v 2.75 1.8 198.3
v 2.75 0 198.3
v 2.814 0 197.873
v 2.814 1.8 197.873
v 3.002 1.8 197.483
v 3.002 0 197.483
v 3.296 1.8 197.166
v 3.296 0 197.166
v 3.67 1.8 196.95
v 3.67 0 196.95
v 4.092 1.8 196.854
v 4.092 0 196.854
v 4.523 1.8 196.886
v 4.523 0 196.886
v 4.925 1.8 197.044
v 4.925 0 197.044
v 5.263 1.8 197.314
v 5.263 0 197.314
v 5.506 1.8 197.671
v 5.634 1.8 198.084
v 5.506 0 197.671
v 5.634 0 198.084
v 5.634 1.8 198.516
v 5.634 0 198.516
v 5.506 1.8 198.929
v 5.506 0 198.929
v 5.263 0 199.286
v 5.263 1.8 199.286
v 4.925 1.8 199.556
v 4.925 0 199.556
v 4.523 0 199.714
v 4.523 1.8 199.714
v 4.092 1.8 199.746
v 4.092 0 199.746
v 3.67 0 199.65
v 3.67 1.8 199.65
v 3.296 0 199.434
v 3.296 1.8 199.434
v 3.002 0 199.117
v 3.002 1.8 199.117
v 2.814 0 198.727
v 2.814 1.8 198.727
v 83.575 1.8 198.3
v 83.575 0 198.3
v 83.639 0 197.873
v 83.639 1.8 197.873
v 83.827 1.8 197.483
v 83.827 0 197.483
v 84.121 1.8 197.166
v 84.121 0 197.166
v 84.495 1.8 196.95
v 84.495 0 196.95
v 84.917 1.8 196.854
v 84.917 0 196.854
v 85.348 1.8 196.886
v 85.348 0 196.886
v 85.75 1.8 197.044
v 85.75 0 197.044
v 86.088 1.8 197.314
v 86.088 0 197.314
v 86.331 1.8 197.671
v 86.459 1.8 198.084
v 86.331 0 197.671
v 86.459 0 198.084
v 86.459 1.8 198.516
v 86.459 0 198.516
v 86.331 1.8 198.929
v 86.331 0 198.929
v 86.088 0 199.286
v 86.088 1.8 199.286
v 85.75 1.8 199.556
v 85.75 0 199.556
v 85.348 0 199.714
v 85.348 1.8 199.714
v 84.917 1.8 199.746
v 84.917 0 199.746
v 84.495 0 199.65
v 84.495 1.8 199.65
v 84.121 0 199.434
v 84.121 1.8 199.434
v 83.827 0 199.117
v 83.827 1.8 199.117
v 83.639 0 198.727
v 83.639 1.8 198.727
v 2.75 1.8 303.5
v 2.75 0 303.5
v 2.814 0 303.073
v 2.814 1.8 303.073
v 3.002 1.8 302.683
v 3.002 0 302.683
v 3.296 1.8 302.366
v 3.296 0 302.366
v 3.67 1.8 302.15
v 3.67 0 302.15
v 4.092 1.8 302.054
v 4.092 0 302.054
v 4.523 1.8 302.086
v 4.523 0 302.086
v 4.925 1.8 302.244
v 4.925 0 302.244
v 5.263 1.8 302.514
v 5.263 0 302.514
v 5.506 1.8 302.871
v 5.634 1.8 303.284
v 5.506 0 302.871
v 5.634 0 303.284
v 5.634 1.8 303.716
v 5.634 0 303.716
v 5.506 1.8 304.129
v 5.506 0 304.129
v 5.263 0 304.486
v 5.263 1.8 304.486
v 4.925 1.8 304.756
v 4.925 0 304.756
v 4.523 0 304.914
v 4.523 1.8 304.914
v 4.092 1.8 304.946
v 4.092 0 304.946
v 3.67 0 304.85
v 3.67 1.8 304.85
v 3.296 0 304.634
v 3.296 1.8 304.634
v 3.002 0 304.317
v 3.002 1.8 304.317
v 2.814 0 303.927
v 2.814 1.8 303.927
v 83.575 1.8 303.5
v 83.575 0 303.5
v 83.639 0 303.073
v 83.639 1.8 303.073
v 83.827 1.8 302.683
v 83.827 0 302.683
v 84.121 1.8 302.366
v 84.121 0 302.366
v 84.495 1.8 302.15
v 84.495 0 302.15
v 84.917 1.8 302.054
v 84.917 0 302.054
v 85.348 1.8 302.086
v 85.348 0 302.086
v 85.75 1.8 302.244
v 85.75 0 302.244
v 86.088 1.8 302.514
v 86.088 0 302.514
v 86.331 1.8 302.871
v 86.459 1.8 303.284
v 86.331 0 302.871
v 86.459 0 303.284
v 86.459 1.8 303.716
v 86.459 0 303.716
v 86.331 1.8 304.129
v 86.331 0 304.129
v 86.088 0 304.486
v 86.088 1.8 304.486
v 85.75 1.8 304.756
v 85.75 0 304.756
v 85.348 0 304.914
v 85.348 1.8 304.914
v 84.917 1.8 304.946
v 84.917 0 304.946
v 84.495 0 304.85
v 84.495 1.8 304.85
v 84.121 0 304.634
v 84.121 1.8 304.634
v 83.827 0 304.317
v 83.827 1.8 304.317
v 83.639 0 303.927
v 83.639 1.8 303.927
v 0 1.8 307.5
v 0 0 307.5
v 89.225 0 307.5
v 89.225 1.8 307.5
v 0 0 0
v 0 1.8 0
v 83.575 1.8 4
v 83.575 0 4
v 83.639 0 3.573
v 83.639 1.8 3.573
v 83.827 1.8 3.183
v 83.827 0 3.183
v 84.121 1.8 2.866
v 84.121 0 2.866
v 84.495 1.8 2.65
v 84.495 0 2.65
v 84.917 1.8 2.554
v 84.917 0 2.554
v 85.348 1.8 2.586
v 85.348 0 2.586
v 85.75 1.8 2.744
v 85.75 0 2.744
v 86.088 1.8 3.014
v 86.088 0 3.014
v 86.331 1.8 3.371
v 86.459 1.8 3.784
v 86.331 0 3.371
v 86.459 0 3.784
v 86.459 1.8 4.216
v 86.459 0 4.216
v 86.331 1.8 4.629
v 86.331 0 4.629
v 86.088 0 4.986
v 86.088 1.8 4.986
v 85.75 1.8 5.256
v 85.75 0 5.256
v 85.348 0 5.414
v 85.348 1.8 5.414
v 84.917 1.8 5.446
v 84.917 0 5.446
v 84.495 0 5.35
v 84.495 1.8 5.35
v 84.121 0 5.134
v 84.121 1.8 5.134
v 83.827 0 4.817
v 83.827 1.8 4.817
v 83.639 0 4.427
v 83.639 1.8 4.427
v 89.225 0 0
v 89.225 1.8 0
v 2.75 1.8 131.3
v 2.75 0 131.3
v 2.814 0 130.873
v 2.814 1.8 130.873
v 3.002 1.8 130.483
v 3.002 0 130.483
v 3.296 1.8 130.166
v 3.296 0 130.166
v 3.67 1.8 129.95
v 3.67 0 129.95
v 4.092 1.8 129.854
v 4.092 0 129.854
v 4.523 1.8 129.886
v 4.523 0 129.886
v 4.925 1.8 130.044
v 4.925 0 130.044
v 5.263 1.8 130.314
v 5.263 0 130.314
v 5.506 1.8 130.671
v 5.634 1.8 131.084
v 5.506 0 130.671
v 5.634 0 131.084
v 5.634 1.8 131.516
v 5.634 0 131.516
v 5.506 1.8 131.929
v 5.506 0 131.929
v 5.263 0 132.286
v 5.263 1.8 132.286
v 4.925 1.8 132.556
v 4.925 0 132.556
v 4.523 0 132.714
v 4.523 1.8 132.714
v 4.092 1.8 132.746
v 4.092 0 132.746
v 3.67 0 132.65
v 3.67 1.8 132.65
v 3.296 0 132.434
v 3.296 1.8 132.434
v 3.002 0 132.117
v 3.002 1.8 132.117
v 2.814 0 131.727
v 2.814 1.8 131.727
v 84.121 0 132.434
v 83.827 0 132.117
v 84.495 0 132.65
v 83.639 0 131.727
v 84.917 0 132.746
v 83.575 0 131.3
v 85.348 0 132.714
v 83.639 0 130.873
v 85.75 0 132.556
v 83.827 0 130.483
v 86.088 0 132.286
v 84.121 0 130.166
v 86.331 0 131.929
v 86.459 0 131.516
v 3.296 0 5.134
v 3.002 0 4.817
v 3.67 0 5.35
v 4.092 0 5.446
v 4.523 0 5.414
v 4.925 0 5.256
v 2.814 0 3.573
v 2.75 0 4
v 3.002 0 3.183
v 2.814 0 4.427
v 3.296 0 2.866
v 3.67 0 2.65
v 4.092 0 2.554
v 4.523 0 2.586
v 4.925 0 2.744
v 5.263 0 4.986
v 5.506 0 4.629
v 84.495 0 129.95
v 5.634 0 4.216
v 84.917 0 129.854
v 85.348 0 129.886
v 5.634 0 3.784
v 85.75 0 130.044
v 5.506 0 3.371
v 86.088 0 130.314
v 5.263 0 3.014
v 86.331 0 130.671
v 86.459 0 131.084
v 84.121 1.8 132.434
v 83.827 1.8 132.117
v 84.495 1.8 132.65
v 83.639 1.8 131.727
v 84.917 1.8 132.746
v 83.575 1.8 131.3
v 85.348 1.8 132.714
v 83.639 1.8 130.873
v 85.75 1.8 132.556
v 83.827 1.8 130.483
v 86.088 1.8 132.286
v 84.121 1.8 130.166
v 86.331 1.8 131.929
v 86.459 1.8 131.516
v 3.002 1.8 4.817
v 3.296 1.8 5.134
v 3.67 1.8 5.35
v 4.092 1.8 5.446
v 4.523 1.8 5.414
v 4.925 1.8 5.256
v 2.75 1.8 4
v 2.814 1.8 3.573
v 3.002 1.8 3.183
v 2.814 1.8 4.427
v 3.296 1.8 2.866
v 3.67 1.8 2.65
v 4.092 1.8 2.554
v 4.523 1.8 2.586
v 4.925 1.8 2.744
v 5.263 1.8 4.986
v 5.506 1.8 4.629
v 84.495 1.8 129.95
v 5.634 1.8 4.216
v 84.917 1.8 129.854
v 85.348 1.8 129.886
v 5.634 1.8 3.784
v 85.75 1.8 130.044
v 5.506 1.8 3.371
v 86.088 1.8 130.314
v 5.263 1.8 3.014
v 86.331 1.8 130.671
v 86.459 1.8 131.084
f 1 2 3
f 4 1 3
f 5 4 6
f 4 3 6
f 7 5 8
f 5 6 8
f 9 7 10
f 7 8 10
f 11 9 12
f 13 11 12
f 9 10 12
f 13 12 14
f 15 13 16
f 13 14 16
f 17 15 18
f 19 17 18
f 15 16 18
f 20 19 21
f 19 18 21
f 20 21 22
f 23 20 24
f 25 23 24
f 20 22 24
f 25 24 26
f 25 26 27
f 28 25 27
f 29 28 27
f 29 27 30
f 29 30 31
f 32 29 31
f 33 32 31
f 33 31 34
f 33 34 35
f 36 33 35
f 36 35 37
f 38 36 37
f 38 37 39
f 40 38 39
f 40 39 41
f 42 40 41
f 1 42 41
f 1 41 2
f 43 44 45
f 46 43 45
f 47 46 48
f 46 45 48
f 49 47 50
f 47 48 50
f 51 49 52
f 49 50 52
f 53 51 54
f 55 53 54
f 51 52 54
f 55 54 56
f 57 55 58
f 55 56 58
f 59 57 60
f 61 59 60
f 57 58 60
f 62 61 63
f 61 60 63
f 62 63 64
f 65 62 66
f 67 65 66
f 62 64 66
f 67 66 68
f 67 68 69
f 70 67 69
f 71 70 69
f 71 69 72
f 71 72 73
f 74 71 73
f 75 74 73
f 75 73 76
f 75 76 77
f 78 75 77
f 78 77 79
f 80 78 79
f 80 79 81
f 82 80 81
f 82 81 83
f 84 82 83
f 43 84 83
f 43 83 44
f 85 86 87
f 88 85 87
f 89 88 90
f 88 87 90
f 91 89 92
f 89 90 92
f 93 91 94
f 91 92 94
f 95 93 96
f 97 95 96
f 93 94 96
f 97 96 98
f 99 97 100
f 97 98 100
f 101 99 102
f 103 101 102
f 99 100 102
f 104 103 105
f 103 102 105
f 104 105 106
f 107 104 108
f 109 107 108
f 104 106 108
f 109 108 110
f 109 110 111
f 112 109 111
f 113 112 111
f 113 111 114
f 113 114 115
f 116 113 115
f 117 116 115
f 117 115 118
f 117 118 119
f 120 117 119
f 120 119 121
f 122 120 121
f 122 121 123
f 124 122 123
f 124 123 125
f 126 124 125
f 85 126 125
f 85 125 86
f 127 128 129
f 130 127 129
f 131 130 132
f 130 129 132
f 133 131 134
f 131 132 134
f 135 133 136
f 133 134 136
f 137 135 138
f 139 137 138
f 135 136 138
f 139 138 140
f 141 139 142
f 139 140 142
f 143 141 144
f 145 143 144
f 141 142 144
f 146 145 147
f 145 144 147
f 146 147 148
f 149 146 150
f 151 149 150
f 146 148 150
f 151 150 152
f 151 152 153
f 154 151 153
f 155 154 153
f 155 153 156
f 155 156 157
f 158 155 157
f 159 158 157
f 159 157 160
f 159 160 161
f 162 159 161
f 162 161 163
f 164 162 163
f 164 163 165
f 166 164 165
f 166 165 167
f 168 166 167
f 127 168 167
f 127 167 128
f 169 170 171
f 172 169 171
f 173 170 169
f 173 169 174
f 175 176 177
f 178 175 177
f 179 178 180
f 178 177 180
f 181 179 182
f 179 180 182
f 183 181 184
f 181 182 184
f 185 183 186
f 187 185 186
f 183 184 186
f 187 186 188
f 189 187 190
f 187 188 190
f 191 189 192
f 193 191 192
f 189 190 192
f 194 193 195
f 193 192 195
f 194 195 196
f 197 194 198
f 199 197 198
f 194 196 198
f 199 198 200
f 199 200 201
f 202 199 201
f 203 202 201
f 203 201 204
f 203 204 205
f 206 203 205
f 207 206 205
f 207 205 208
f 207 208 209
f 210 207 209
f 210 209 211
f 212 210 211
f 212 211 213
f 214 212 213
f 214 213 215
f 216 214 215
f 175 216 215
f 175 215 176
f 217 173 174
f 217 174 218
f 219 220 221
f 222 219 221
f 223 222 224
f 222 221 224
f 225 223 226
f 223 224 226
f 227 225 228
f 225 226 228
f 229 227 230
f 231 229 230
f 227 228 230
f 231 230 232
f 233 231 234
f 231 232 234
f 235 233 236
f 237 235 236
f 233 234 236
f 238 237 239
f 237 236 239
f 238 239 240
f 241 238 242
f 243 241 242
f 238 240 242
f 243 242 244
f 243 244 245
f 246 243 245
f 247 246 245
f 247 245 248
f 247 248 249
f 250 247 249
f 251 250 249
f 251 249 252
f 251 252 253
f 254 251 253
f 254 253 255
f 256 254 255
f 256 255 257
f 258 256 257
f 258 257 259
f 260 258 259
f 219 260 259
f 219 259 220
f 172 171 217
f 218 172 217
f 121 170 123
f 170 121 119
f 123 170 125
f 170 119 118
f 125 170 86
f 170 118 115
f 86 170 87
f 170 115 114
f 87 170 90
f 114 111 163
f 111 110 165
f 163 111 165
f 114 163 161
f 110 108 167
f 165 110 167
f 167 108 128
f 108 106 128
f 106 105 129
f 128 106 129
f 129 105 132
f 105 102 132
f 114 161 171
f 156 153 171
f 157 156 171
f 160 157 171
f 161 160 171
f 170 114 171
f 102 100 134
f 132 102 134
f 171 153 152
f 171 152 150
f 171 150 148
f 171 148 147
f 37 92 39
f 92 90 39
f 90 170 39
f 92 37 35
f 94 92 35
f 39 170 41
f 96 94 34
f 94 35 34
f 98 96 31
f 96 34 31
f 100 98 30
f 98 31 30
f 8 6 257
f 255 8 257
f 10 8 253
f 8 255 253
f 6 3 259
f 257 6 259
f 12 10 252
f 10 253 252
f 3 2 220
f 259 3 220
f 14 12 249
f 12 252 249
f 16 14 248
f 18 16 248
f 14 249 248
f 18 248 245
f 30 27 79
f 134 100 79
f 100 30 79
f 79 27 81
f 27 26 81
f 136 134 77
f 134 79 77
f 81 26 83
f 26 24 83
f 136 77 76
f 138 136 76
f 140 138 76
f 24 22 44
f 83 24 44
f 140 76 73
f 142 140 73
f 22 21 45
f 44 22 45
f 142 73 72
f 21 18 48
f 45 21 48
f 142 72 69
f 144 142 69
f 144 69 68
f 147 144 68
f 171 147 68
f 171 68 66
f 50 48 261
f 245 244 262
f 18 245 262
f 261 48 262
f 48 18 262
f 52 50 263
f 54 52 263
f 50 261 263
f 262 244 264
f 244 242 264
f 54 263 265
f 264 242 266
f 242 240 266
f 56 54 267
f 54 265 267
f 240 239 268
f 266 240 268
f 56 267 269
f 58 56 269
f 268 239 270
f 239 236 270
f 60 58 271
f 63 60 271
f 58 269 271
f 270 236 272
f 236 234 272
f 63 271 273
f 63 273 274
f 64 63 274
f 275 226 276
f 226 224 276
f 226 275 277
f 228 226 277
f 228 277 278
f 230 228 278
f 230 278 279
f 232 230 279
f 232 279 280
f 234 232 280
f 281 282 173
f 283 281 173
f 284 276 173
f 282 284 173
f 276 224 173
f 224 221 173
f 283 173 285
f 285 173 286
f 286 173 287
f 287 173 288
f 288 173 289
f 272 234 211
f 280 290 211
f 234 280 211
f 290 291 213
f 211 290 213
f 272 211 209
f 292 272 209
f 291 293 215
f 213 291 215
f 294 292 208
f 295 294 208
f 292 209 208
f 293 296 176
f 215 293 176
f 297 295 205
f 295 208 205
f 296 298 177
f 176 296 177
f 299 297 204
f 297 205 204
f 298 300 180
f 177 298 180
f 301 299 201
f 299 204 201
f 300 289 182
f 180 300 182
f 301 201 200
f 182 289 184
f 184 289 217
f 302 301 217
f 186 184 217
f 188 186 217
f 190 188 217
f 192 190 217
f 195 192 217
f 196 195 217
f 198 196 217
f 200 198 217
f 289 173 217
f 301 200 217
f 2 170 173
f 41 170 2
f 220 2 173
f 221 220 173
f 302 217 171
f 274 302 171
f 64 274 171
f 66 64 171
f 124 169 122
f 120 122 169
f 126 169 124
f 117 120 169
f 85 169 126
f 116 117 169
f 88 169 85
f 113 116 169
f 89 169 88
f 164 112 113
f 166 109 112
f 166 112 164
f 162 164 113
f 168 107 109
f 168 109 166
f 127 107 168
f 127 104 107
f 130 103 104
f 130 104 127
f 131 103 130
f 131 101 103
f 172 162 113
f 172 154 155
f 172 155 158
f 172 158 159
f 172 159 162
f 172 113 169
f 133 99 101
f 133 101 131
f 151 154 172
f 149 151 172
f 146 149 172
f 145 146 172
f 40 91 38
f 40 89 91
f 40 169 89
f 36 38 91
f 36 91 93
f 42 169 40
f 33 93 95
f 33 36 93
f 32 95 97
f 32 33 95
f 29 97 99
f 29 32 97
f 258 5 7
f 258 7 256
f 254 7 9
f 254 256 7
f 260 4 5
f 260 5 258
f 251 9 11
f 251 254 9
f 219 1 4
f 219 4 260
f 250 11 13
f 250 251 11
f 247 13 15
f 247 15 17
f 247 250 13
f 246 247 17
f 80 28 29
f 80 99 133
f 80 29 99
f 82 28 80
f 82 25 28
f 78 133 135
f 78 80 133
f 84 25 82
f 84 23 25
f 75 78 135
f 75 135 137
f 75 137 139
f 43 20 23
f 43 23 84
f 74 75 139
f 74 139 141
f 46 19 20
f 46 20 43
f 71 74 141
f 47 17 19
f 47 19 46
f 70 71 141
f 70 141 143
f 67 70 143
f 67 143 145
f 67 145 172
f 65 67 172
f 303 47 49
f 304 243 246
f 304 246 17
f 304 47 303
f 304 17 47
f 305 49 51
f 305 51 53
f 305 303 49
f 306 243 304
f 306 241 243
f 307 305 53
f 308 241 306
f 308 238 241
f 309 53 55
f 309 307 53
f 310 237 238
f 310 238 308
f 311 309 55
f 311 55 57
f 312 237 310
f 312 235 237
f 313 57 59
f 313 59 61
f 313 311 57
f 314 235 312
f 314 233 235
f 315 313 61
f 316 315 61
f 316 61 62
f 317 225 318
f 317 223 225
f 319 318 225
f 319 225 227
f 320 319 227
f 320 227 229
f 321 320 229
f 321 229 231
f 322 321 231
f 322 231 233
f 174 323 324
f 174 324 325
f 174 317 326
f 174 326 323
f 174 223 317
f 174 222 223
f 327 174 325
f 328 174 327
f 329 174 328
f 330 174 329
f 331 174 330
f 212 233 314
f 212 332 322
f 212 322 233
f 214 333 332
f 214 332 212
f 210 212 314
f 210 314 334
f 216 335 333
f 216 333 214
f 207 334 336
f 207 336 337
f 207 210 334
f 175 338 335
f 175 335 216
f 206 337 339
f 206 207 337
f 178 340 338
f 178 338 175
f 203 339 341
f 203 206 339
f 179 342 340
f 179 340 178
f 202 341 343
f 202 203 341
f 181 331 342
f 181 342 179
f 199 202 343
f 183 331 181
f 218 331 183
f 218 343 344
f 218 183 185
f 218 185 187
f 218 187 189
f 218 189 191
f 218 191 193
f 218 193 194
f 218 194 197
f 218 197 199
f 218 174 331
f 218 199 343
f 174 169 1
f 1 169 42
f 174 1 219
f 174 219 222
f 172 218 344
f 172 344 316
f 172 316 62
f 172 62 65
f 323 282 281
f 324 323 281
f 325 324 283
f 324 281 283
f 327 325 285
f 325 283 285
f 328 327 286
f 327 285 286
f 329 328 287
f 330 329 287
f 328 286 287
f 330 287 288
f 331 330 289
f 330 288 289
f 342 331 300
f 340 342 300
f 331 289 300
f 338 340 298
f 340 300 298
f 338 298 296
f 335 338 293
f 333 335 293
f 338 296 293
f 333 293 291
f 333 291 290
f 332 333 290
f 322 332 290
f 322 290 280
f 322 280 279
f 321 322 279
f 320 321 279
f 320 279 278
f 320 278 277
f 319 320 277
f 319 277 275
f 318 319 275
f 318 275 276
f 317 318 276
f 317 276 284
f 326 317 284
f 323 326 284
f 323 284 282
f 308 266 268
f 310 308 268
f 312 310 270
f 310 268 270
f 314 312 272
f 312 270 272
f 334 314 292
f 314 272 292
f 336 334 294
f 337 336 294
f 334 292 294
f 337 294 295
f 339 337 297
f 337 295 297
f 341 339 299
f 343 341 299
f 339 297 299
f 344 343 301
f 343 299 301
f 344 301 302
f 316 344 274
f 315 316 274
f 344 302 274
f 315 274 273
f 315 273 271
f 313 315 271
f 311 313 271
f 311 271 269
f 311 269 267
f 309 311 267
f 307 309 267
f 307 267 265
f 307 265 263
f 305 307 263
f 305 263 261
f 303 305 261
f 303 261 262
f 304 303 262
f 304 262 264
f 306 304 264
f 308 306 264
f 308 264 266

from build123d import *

# Parameters (mm, degrees)
SKETCH1_W              = 89.225
SKETCH1_H              = 307.5
BOSS_EXTRUDE1_DEPTH    = 1.8
M2_5_CLEARANCE_HOLE1_D = 2.9


with BuildPart() as part:
    # Sketch1 → Boss-Extrude1 (new body)
    with BuildSketch(Plane(origin=(0, 0, 0), x_dir=(1, 0, 0), z_dir=(0, 1, 0))):
        with Locations((44.6125, -153.75)):
            Rectangle(SKETCH1_W, SKETCH1_H)
    extrude(amount=BOSS_EXTRUDE1_DEPTH)

    # M2.5 Clearance Hole1 (through all)
    with Locations(Plane(origin=(0, 1.8, 0), x_dir=(1, 0, 0), z_dir=(0, 1, 0))):
        with Locations((4.2, -4), (85.025, -4), (85.025, -131.3), (85.025, -198.3), (85.025, -303.5), (4.2, -303.5), (4.2, -198.3), (4.2, -131.3)):
            Hole(M2_5_CLEARANCE_HOLE1_D / 2)


solid = part.part
